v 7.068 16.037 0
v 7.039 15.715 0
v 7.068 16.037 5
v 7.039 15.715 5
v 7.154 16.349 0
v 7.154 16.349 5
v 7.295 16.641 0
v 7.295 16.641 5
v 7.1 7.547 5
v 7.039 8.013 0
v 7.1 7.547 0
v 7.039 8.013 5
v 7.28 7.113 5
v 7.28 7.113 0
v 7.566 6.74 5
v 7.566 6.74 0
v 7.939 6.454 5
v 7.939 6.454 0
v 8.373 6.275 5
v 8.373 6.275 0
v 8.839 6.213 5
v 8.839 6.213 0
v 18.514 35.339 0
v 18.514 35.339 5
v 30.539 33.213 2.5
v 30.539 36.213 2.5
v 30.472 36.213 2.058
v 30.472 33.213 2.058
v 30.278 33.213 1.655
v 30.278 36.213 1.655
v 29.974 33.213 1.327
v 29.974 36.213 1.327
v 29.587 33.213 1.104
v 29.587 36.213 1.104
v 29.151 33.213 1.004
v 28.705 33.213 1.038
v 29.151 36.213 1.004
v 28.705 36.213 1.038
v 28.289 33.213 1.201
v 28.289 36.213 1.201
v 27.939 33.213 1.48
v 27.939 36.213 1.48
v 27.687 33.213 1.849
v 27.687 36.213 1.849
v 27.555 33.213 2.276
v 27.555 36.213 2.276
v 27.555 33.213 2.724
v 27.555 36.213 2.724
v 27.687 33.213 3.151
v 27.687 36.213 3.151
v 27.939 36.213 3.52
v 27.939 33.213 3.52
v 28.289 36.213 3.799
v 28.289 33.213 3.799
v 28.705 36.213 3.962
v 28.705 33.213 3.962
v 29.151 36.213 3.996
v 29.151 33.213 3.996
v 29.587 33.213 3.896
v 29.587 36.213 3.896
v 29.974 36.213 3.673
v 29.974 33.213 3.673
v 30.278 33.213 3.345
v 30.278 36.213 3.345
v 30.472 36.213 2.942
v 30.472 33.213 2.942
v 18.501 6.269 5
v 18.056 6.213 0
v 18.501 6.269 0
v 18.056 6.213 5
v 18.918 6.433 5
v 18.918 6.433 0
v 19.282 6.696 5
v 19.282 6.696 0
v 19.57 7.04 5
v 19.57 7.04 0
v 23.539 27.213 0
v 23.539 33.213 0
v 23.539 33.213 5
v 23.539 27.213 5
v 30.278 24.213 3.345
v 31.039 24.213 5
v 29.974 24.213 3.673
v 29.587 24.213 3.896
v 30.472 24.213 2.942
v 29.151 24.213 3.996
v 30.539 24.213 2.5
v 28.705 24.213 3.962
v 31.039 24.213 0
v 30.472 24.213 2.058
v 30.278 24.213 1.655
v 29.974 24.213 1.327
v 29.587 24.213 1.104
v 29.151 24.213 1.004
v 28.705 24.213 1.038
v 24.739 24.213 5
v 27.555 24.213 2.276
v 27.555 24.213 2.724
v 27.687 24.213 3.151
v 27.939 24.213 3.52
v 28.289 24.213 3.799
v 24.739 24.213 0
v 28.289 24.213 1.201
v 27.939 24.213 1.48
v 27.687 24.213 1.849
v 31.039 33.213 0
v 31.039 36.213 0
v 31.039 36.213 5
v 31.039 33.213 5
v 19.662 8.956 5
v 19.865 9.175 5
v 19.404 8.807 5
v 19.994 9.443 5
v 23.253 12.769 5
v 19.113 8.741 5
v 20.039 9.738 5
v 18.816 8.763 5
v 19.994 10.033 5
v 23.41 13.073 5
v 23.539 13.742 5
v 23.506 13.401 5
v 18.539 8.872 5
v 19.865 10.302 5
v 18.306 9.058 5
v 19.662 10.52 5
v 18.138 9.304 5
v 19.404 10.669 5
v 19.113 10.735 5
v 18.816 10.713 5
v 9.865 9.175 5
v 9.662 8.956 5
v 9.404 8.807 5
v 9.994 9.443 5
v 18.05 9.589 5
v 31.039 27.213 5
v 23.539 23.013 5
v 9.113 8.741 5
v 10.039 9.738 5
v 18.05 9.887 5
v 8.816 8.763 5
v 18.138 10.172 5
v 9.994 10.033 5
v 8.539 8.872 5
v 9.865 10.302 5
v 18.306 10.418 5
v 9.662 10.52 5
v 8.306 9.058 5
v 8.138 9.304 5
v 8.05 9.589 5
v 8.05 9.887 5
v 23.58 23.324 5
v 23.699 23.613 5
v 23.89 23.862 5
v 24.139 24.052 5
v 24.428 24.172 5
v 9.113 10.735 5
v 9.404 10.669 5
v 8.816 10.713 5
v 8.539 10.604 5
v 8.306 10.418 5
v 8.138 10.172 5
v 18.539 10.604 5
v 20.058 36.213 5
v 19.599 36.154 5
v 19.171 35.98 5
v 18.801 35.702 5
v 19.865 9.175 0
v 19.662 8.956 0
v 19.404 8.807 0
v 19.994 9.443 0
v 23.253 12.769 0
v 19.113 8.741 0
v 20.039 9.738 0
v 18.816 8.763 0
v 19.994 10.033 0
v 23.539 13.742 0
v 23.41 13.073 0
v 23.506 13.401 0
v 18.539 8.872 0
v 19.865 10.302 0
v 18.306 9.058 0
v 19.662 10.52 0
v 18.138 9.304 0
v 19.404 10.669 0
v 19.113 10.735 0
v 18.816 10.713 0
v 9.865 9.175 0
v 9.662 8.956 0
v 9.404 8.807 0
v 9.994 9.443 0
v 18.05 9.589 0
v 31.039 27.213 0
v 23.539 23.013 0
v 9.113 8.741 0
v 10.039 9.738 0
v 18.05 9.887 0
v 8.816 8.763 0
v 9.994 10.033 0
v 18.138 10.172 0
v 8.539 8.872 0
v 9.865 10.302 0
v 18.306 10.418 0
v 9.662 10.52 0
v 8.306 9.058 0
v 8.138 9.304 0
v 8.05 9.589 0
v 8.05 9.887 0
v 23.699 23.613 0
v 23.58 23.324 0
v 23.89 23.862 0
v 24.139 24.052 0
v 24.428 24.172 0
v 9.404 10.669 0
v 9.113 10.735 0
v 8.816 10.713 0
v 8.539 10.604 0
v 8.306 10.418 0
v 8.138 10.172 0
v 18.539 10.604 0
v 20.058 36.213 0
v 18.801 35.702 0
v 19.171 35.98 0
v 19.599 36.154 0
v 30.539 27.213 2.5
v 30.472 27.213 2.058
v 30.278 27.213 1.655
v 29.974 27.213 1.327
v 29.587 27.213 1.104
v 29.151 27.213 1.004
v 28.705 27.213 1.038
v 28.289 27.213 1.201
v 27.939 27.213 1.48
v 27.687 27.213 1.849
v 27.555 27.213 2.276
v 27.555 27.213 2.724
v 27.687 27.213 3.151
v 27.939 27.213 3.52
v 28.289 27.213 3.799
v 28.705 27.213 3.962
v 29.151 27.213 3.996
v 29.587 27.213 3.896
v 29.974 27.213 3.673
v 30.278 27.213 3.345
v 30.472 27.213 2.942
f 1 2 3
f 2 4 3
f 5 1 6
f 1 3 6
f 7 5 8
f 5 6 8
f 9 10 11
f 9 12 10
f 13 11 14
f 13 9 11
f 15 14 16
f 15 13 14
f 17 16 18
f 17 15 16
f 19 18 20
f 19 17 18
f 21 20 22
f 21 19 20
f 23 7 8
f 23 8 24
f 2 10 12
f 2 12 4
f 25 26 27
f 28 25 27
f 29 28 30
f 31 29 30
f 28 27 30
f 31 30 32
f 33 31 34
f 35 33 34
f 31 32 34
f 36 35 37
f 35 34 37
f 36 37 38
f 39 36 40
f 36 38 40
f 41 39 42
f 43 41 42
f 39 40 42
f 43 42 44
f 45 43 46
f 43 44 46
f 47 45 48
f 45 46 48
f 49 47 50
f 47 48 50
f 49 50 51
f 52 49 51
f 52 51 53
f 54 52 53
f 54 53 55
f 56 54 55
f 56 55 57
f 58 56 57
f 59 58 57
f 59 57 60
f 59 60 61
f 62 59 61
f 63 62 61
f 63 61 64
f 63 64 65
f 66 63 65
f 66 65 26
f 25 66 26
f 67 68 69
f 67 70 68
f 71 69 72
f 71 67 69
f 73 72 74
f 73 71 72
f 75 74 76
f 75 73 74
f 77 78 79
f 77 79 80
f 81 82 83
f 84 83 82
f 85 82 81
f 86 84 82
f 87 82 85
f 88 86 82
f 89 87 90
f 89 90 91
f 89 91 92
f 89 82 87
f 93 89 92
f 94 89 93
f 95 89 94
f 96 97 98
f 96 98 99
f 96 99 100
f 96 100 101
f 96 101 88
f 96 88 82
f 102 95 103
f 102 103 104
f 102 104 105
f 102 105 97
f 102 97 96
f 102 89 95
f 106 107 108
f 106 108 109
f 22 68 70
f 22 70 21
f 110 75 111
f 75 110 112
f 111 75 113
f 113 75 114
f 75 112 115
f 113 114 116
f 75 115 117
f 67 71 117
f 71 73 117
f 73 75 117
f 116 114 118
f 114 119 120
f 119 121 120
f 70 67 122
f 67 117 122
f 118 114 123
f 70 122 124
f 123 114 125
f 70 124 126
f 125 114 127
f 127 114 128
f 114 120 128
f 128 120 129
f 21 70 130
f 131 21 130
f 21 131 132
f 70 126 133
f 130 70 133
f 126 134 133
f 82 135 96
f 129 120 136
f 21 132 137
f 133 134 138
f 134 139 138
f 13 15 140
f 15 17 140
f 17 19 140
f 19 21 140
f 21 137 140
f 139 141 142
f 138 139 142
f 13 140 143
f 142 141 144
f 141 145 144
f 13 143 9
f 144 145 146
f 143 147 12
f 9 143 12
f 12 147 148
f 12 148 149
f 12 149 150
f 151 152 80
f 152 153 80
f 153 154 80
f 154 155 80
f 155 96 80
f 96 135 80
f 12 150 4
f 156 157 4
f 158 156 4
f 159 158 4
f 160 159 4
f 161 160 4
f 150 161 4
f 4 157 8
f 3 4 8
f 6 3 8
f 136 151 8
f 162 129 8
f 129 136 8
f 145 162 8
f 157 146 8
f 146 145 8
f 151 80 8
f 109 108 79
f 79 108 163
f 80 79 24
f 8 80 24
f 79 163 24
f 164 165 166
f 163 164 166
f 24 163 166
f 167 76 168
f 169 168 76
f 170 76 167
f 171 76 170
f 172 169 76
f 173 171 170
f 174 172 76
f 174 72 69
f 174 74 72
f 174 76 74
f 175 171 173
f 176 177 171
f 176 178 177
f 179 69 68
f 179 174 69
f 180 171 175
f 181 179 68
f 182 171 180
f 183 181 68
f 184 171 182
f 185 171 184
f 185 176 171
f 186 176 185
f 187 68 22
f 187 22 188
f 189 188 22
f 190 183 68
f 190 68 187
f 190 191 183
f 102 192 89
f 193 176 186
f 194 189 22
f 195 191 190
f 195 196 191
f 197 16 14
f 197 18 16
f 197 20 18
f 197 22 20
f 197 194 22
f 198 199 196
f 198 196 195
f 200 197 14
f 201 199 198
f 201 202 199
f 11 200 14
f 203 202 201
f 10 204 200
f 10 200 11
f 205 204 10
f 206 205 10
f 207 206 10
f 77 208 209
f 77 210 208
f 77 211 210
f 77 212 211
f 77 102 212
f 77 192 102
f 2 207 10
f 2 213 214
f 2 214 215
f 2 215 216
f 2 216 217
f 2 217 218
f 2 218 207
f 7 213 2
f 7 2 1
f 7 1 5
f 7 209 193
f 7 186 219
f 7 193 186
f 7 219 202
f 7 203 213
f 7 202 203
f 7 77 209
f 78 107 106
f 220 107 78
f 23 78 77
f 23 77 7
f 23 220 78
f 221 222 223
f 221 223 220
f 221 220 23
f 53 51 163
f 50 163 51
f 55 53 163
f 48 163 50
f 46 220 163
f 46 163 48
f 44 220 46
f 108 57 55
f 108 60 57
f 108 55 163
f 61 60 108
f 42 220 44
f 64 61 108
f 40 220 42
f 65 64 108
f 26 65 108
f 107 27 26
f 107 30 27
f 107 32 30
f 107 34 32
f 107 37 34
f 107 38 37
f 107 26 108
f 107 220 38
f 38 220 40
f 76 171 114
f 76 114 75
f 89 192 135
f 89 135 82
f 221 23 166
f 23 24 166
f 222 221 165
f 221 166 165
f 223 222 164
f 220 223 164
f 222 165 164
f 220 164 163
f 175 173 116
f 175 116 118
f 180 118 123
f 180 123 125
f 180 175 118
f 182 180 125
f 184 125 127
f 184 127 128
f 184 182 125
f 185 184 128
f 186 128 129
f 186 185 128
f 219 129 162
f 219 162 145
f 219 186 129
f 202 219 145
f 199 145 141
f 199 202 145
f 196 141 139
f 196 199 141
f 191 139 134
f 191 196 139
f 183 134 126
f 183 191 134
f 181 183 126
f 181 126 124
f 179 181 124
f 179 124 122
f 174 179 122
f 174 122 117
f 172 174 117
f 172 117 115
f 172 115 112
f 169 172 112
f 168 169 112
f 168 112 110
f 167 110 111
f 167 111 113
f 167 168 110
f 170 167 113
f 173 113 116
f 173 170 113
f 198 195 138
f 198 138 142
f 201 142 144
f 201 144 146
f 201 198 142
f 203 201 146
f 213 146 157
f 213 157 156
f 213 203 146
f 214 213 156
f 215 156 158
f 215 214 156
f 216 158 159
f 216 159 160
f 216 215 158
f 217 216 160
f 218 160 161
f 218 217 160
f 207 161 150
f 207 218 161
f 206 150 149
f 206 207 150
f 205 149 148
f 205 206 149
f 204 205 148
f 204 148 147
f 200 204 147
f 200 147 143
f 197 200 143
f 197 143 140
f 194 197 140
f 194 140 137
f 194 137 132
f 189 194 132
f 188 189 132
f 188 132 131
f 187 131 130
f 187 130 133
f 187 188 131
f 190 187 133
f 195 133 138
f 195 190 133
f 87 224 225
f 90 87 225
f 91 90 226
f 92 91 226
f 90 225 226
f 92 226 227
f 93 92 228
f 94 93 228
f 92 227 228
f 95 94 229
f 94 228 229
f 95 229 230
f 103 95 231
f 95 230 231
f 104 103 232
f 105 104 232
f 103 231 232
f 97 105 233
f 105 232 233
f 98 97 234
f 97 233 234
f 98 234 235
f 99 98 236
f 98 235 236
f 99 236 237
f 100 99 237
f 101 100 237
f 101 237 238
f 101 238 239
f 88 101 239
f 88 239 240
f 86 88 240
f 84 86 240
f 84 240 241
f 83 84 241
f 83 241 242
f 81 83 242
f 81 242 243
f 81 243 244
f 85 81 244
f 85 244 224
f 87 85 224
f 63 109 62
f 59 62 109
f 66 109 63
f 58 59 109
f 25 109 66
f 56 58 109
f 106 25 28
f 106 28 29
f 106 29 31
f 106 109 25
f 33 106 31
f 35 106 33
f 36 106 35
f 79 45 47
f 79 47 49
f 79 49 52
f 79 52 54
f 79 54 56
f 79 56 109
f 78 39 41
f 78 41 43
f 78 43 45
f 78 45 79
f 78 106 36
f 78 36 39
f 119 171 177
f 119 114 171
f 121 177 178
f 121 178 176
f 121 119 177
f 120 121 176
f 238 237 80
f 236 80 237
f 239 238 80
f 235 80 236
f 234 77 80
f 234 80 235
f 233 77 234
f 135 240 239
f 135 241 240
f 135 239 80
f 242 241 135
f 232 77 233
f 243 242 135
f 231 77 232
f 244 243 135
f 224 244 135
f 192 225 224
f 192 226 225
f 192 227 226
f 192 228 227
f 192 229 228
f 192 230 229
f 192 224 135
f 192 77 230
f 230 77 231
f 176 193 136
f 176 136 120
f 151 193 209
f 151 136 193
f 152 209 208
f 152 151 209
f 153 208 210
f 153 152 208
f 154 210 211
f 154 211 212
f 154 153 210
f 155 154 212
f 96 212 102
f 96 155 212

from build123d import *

# Parameters (mm, degrees)
SKETCH1_R      = 1
EXTRUDE1_DEPTH = 5
FILLET2_R      = 1.8
FILLET3_R      = 1.2
SKETCH3_R      = 1.5
EXTRUDE2_DEPTH = 17


with BuildPart() as part:
    # Sketch1 → Extrude1 (new body)
    with BuildSketch(Plane.XY):
        Polygon((7.038618211, 6.213258786), (7.038618211, 16.213258786), (19.038618211, 36.213258786), (31.038618211, 36.213258786), (31.038618211, 33.213258786), (23.538618211, 33.213258786), (23.538618211, 27.213258786), (31.038618211, 27.213258786), (31.038618211, 24.213258786), (23.538618211, 24.213258786), (23.538618211, 13.213258786), (19.038618211, 6.213258786), align=None)
        with Locations((9.038618211, 9.738237996)):
            Circle(SKETCH1_R, mode=Mode.SUBTRACT)
        with Locations((19.038618211, 9.738237996)):
            Circle(SKETCH1_R, mode=Mode.SUBTRACT)
    extrude(amount=EXTRUDE1_DEPTH)

    # Fillet2
    fillet2_edges = [part.edges().sort_by_distance(p)[0] for p in [
        (7.038618211, 6.213258786, 2.5),
        (7.038618211, 16.213258786, 2.5),
        (19.038618211, 36.213258786, 2.5),
        (23.538618211, 13.213258786, 2.5),
        (19.038618211, 6.213258786, 2.5),
    ]]
    fillet(fillet2_edges, radius=FILLET2_R)

    # Fillet3
    fillet3_edges = [part.edges().sort_by_distance(p)[0] for p in [
        (23.538618211, 24.213258786, 2.5),
    ]]
    fillet(fillet3_edges, radius=FILLET3_R)

    # Sketch3 → Extrude2 (cut)
    with BuildSketch(Plane(origin=(0, 36.213258786, 0), x_dir=(1, 0, 0), z_dir=(0, 1, 0))):
        with Locations((29.038618211, -2.5)):
            Circle(SKETCH3_R)
    extrude(amount=-EXTRUDE2_DEPTH, mode=Mode.SUBTRACT)


solid = part.part
